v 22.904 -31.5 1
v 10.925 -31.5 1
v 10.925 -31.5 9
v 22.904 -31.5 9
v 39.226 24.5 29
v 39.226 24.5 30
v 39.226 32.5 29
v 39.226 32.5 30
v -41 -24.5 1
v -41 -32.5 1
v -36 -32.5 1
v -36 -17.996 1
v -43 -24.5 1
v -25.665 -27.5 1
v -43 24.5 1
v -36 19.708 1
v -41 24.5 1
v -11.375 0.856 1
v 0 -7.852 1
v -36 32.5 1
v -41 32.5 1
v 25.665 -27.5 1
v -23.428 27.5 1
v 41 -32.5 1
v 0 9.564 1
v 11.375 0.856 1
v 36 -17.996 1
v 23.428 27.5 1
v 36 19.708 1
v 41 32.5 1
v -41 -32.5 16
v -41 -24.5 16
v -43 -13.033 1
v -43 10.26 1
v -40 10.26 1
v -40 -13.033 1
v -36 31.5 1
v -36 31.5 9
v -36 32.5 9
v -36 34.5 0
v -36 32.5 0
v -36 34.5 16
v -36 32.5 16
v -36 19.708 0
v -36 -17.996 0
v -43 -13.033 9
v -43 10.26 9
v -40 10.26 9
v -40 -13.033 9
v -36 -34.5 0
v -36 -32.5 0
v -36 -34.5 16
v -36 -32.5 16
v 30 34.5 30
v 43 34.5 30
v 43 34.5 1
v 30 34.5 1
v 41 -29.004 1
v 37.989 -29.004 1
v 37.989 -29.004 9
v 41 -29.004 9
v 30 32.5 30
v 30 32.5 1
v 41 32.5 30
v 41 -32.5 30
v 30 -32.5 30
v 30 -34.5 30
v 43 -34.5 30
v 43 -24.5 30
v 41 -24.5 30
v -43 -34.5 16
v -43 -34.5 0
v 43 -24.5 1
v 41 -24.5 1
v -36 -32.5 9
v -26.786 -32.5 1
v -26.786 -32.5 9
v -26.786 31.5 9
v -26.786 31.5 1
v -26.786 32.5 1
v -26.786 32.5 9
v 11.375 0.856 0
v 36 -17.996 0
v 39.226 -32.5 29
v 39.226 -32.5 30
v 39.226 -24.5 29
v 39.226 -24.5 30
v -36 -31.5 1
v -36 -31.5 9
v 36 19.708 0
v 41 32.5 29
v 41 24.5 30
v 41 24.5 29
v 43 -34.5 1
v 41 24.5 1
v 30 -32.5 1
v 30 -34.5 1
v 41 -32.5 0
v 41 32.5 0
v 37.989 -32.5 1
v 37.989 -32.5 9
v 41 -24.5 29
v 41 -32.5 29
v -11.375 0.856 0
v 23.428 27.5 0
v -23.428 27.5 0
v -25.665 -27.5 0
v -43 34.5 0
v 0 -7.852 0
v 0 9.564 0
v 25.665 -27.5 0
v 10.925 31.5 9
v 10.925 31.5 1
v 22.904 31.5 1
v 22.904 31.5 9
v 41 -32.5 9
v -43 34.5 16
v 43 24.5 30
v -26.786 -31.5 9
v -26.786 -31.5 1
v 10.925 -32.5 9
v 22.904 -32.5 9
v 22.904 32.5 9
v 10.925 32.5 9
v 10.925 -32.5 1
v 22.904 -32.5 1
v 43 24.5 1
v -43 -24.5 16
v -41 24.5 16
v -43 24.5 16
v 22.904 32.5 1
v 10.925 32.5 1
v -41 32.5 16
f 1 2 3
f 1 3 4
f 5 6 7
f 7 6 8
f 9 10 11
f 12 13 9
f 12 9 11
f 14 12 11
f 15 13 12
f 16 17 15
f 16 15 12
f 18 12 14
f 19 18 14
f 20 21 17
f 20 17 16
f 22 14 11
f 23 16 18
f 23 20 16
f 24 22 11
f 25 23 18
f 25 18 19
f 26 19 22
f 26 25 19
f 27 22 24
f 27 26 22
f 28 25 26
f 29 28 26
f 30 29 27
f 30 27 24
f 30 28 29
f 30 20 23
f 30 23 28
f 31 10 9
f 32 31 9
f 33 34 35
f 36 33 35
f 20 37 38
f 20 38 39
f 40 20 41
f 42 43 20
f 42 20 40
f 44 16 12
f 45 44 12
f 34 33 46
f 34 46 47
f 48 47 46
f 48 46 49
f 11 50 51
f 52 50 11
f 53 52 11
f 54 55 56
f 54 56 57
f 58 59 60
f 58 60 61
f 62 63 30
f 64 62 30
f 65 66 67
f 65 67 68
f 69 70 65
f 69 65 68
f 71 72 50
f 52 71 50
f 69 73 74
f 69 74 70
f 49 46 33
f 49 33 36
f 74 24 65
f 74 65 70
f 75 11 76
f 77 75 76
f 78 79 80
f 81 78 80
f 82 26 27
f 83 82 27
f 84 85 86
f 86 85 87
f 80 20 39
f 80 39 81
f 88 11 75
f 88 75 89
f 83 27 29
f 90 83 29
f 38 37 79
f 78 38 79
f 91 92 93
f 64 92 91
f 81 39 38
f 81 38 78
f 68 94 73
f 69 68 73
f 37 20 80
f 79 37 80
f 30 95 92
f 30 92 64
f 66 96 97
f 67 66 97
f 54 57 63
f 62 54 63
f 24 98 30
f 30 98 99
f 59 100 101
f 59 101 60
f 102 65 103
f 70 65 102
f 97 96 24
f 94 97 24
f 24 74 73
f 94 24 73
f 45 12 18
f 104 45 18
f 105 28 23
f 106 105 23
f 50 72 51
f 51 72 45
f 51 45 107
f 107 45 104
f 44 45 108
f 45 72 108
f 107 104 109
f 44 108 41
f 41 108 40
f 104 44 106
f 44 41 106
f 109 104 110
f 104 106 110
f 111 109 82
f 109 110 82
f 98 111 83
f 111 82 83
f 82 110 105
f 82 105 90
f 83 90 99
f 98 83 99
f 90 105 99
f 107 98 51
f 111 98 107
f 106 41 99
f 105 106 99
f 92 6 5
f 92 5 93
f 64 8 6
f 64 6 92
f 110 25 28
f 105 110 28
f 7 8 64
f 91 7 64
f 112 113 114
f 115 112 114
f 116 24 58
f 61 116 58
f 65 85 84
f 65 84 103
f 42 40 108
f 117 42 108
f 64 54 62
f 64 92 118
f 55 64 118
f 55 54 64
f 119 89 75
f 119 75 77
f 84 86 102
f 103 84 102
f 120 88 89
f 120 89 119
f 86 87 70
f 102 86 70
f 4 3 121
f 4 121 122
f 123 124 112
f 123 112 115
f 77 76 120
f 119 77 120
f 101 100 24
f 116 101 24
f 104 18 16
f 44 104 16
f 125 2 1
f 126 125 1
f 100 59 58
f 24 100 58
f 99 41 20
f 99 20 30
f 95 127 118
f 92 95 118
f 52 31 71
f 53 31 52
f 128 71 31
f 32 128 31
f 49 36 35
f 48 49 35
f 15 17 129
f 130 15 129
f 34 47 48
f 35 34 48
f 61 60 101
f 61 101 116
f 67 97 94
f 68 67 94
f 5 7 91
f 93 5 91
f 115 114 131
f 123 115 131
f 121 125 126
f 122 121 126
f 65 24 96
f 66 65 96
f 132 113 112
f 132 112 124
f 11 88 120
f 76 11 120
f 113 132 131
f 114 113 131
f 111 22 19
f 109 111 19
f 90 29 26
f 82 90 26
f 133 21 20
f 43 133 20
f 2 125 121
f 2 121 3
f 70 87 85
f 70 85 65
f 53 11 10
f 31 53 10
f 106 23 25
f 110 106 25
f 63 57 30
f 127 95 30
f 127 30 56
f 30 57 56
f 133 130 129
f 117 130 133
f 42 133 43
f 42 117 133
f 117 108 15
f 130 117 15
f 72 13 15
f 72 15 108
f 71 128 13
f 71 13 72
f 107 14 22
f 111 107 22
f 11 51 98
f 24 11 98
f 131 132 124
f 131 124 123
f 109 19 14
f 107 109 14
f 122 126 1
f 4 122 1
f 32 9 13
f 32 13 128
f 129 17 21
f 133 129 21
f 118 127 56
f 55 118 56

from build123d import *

# Parameters (mm, degrees)
F0_W          = 82
F0_H          = 65
F1_DEPTH      = 1
F4_DEPTH      = 100
F2_W          = 2
F2_H          = 65
F5_DEPTH      = 15
F5_DEPTH_BACK = 1
F6_DEPTH      = 29
F7_W          = 49
F7_H          = 29
F8_DEPTH      = 86.001
F9_W          = 3
F9_H          = 23.2922537252
F10_DEPTH     = 8
F9_W_2        = 9.2139073312
F9_H_2        = 1
F9_W_3        = 11.9788721204
F9_W_4        = 3.0114415884
F9_H_3        = 3.4955975413
F11_W         = 1.7739150524
F11_H         = 8
F12_DEPTH     = 1


with BuildPart() as f1:
    # F0 (on Top) → F1 (new body)
    with BuildSketch(Plane.XY):
        Rectangle(F0_W, F0_H)
    extrude(amount=F1_DEPTH)

    # F3 (on face) → F4 (cut)
    with BuildSketch(Plane.XY.offset(1)):
        Polygon((-11.3747352852, 0.8560366094), (-36, 19.7082804236), (-36, -17.9962072049), align=None)
        Polygon((23.4282652494, 27.5), (-23.4282652494, 27.5), (0, 9.5641372289), align=None)
        Polygon((36, 19.7082804236), (11.3747352852, 0.8560366094), (36, -17.9962072049), align=None)
        Polygon((25.6646174119, -27.5), (0, -7.8520640102), (-25.6646174119, -27.5), align=None)
    extrude(amount=-F4_DEPTH, mode=Mode.SUBTRACT)

    # F2 (on face) → F5 (join, two sides)
    with BuildSketch(Plane.XY.offset(1)) as f5_sk:
        with Locations((-42, 0)):
            Rectangle(F2_W, F2_H)
        Polygon((-43, 32.5), (-41, 32.5), (-36, 32.5), (-36, 34.5), (-43, 34.5), align=None)
        Polygon((-36, -32.5), (-41, -32.5), (-43, -32.5), (-43, -34.5), (-36, -34.5), align=None)
    extrude(amount=F5_DEPTH)
    extrude(f5_sk.sketch, amount=-F5_DEPTH_BACK)


with BuildPart() as f6:
    # F2 (on face) → F6 (new body)
    with BuildSketch(Plane.XY.offset(1)):
        Polygon((30, 34.5), (30, 32.5), (41, 32.5), (43, 32.5), (43, 34.5), align=None)
        with Locations((42, 0)):
            Rectangle(F2_W, F2_H)
        Polygon((41, -32.5), (30, -32.5), (30, -34.5), (43, -34.5), (43, -32.5), align=None)
    extrude(amount=F6_DEPTH)


with BuildPart() as f8_tool:
    # F7 (on face) → F8 (new body, through all)
    with BuildSketch(Plane.YZ.offset(43)):
        with Locations((0, 15.5)):
            Rectangle(F7_W, F7_H)
    extrude(amount=-F8_DEPTH)


with BuildPart() as f1_1:
    add(f1.part)

    # F8: cut by f8_tool
    add(f8_tool.part, mode=Mode.SUBTRACT)


with BuildPart() as f6_1:
    add(f6.part)

    # F8: cut by f8_tool
    add(f8_tool.part, mode=Mode.SUBTRACT)


with BuildPart() as f10:
    # F9 (on face) → F10 (new body)
    with BuildSketch(Plane.XY.offset(1)):
        with Locations((-41.5, -1.3864436187)):
            Rectangle(F9_W, F9_H)
    extrude(amount=F10_DEPTH)


with BuildPart() as f10b:
    # F9 (on face) → F10, piece 2 (new body)
    with BuildSketch(Plane.XY.offset(1)):
        with Locations((-31.3930463344, 32)):
            Rectangle(F9_W_2, F9_H_2)
    extrude(amount=F10_DEPTH)


with BuildPart() as f10c:
    # F9 (on face) → F10, piece 3 (new body)
    with BuildSketch(Plane.XY.offset(1)):
        with Locations((16.9146135449, 32)):
            Rectangle(F9_W_3, F9_H_2)
    extrude(amount=F10_DEPTH)


with BuildPart() as f10d:
    # F9 (on face) → F10, piece 4 (new body)
    with BuildSketch(Plane.XY.offset(1)):
        with Locations((-31.3930463344, -32)):
            Rectangle(F9_W_2, F9_H_2)
    extrude(amount=F10_DEPTH)


with BuildPart() as f10e:
    # F9 (on face) → F10, piece 5 (new body)
    with BuildSketch(Plane.XY.offset(1)):
        with Locations((16.9146135449, -32)):
            Rectangle(F9_W_3, F9_H_2)
    extrude(amount=F10_DEPTH)


with BuildPart() as f10f:
    # F9 (on face) → F10, piece 6 (new body)
    with BuildSketch(Plane.XY.offset(1)):
        with Locations((39.4942792058, -30.7522012293)):
            Rectangle(F9_W_4, F9_H_3)
    extrude(amount=F10_DEPTH)


with BuildPart() as f12:
    # F11 (on face) → F12 (new body)
    with BuildSketch(Plane.XY.offset(30)):
        with Locations((40.1130424738, 28.5)):
            Rectangle(F11_W, F11_H)
    extrude(amount=-F12_DEPTH)


with BuildPart() as f12b:
    # F11 (on face) → F12, piece 2 (new body)
    with BuildSketch(Plane.XY.offset(30)):
        with Locations((40.1130424738, -28.5)):
            Rectangle(F11_W, F11_H)
    extrude(amount=-F12_DEPTH)


solid = Compound([f1_1.part, f6_1.part, f10.part, f10b.part, f10c.part, f10d.part, f10e.part, f10f.part, f12.part, f12b.part])
